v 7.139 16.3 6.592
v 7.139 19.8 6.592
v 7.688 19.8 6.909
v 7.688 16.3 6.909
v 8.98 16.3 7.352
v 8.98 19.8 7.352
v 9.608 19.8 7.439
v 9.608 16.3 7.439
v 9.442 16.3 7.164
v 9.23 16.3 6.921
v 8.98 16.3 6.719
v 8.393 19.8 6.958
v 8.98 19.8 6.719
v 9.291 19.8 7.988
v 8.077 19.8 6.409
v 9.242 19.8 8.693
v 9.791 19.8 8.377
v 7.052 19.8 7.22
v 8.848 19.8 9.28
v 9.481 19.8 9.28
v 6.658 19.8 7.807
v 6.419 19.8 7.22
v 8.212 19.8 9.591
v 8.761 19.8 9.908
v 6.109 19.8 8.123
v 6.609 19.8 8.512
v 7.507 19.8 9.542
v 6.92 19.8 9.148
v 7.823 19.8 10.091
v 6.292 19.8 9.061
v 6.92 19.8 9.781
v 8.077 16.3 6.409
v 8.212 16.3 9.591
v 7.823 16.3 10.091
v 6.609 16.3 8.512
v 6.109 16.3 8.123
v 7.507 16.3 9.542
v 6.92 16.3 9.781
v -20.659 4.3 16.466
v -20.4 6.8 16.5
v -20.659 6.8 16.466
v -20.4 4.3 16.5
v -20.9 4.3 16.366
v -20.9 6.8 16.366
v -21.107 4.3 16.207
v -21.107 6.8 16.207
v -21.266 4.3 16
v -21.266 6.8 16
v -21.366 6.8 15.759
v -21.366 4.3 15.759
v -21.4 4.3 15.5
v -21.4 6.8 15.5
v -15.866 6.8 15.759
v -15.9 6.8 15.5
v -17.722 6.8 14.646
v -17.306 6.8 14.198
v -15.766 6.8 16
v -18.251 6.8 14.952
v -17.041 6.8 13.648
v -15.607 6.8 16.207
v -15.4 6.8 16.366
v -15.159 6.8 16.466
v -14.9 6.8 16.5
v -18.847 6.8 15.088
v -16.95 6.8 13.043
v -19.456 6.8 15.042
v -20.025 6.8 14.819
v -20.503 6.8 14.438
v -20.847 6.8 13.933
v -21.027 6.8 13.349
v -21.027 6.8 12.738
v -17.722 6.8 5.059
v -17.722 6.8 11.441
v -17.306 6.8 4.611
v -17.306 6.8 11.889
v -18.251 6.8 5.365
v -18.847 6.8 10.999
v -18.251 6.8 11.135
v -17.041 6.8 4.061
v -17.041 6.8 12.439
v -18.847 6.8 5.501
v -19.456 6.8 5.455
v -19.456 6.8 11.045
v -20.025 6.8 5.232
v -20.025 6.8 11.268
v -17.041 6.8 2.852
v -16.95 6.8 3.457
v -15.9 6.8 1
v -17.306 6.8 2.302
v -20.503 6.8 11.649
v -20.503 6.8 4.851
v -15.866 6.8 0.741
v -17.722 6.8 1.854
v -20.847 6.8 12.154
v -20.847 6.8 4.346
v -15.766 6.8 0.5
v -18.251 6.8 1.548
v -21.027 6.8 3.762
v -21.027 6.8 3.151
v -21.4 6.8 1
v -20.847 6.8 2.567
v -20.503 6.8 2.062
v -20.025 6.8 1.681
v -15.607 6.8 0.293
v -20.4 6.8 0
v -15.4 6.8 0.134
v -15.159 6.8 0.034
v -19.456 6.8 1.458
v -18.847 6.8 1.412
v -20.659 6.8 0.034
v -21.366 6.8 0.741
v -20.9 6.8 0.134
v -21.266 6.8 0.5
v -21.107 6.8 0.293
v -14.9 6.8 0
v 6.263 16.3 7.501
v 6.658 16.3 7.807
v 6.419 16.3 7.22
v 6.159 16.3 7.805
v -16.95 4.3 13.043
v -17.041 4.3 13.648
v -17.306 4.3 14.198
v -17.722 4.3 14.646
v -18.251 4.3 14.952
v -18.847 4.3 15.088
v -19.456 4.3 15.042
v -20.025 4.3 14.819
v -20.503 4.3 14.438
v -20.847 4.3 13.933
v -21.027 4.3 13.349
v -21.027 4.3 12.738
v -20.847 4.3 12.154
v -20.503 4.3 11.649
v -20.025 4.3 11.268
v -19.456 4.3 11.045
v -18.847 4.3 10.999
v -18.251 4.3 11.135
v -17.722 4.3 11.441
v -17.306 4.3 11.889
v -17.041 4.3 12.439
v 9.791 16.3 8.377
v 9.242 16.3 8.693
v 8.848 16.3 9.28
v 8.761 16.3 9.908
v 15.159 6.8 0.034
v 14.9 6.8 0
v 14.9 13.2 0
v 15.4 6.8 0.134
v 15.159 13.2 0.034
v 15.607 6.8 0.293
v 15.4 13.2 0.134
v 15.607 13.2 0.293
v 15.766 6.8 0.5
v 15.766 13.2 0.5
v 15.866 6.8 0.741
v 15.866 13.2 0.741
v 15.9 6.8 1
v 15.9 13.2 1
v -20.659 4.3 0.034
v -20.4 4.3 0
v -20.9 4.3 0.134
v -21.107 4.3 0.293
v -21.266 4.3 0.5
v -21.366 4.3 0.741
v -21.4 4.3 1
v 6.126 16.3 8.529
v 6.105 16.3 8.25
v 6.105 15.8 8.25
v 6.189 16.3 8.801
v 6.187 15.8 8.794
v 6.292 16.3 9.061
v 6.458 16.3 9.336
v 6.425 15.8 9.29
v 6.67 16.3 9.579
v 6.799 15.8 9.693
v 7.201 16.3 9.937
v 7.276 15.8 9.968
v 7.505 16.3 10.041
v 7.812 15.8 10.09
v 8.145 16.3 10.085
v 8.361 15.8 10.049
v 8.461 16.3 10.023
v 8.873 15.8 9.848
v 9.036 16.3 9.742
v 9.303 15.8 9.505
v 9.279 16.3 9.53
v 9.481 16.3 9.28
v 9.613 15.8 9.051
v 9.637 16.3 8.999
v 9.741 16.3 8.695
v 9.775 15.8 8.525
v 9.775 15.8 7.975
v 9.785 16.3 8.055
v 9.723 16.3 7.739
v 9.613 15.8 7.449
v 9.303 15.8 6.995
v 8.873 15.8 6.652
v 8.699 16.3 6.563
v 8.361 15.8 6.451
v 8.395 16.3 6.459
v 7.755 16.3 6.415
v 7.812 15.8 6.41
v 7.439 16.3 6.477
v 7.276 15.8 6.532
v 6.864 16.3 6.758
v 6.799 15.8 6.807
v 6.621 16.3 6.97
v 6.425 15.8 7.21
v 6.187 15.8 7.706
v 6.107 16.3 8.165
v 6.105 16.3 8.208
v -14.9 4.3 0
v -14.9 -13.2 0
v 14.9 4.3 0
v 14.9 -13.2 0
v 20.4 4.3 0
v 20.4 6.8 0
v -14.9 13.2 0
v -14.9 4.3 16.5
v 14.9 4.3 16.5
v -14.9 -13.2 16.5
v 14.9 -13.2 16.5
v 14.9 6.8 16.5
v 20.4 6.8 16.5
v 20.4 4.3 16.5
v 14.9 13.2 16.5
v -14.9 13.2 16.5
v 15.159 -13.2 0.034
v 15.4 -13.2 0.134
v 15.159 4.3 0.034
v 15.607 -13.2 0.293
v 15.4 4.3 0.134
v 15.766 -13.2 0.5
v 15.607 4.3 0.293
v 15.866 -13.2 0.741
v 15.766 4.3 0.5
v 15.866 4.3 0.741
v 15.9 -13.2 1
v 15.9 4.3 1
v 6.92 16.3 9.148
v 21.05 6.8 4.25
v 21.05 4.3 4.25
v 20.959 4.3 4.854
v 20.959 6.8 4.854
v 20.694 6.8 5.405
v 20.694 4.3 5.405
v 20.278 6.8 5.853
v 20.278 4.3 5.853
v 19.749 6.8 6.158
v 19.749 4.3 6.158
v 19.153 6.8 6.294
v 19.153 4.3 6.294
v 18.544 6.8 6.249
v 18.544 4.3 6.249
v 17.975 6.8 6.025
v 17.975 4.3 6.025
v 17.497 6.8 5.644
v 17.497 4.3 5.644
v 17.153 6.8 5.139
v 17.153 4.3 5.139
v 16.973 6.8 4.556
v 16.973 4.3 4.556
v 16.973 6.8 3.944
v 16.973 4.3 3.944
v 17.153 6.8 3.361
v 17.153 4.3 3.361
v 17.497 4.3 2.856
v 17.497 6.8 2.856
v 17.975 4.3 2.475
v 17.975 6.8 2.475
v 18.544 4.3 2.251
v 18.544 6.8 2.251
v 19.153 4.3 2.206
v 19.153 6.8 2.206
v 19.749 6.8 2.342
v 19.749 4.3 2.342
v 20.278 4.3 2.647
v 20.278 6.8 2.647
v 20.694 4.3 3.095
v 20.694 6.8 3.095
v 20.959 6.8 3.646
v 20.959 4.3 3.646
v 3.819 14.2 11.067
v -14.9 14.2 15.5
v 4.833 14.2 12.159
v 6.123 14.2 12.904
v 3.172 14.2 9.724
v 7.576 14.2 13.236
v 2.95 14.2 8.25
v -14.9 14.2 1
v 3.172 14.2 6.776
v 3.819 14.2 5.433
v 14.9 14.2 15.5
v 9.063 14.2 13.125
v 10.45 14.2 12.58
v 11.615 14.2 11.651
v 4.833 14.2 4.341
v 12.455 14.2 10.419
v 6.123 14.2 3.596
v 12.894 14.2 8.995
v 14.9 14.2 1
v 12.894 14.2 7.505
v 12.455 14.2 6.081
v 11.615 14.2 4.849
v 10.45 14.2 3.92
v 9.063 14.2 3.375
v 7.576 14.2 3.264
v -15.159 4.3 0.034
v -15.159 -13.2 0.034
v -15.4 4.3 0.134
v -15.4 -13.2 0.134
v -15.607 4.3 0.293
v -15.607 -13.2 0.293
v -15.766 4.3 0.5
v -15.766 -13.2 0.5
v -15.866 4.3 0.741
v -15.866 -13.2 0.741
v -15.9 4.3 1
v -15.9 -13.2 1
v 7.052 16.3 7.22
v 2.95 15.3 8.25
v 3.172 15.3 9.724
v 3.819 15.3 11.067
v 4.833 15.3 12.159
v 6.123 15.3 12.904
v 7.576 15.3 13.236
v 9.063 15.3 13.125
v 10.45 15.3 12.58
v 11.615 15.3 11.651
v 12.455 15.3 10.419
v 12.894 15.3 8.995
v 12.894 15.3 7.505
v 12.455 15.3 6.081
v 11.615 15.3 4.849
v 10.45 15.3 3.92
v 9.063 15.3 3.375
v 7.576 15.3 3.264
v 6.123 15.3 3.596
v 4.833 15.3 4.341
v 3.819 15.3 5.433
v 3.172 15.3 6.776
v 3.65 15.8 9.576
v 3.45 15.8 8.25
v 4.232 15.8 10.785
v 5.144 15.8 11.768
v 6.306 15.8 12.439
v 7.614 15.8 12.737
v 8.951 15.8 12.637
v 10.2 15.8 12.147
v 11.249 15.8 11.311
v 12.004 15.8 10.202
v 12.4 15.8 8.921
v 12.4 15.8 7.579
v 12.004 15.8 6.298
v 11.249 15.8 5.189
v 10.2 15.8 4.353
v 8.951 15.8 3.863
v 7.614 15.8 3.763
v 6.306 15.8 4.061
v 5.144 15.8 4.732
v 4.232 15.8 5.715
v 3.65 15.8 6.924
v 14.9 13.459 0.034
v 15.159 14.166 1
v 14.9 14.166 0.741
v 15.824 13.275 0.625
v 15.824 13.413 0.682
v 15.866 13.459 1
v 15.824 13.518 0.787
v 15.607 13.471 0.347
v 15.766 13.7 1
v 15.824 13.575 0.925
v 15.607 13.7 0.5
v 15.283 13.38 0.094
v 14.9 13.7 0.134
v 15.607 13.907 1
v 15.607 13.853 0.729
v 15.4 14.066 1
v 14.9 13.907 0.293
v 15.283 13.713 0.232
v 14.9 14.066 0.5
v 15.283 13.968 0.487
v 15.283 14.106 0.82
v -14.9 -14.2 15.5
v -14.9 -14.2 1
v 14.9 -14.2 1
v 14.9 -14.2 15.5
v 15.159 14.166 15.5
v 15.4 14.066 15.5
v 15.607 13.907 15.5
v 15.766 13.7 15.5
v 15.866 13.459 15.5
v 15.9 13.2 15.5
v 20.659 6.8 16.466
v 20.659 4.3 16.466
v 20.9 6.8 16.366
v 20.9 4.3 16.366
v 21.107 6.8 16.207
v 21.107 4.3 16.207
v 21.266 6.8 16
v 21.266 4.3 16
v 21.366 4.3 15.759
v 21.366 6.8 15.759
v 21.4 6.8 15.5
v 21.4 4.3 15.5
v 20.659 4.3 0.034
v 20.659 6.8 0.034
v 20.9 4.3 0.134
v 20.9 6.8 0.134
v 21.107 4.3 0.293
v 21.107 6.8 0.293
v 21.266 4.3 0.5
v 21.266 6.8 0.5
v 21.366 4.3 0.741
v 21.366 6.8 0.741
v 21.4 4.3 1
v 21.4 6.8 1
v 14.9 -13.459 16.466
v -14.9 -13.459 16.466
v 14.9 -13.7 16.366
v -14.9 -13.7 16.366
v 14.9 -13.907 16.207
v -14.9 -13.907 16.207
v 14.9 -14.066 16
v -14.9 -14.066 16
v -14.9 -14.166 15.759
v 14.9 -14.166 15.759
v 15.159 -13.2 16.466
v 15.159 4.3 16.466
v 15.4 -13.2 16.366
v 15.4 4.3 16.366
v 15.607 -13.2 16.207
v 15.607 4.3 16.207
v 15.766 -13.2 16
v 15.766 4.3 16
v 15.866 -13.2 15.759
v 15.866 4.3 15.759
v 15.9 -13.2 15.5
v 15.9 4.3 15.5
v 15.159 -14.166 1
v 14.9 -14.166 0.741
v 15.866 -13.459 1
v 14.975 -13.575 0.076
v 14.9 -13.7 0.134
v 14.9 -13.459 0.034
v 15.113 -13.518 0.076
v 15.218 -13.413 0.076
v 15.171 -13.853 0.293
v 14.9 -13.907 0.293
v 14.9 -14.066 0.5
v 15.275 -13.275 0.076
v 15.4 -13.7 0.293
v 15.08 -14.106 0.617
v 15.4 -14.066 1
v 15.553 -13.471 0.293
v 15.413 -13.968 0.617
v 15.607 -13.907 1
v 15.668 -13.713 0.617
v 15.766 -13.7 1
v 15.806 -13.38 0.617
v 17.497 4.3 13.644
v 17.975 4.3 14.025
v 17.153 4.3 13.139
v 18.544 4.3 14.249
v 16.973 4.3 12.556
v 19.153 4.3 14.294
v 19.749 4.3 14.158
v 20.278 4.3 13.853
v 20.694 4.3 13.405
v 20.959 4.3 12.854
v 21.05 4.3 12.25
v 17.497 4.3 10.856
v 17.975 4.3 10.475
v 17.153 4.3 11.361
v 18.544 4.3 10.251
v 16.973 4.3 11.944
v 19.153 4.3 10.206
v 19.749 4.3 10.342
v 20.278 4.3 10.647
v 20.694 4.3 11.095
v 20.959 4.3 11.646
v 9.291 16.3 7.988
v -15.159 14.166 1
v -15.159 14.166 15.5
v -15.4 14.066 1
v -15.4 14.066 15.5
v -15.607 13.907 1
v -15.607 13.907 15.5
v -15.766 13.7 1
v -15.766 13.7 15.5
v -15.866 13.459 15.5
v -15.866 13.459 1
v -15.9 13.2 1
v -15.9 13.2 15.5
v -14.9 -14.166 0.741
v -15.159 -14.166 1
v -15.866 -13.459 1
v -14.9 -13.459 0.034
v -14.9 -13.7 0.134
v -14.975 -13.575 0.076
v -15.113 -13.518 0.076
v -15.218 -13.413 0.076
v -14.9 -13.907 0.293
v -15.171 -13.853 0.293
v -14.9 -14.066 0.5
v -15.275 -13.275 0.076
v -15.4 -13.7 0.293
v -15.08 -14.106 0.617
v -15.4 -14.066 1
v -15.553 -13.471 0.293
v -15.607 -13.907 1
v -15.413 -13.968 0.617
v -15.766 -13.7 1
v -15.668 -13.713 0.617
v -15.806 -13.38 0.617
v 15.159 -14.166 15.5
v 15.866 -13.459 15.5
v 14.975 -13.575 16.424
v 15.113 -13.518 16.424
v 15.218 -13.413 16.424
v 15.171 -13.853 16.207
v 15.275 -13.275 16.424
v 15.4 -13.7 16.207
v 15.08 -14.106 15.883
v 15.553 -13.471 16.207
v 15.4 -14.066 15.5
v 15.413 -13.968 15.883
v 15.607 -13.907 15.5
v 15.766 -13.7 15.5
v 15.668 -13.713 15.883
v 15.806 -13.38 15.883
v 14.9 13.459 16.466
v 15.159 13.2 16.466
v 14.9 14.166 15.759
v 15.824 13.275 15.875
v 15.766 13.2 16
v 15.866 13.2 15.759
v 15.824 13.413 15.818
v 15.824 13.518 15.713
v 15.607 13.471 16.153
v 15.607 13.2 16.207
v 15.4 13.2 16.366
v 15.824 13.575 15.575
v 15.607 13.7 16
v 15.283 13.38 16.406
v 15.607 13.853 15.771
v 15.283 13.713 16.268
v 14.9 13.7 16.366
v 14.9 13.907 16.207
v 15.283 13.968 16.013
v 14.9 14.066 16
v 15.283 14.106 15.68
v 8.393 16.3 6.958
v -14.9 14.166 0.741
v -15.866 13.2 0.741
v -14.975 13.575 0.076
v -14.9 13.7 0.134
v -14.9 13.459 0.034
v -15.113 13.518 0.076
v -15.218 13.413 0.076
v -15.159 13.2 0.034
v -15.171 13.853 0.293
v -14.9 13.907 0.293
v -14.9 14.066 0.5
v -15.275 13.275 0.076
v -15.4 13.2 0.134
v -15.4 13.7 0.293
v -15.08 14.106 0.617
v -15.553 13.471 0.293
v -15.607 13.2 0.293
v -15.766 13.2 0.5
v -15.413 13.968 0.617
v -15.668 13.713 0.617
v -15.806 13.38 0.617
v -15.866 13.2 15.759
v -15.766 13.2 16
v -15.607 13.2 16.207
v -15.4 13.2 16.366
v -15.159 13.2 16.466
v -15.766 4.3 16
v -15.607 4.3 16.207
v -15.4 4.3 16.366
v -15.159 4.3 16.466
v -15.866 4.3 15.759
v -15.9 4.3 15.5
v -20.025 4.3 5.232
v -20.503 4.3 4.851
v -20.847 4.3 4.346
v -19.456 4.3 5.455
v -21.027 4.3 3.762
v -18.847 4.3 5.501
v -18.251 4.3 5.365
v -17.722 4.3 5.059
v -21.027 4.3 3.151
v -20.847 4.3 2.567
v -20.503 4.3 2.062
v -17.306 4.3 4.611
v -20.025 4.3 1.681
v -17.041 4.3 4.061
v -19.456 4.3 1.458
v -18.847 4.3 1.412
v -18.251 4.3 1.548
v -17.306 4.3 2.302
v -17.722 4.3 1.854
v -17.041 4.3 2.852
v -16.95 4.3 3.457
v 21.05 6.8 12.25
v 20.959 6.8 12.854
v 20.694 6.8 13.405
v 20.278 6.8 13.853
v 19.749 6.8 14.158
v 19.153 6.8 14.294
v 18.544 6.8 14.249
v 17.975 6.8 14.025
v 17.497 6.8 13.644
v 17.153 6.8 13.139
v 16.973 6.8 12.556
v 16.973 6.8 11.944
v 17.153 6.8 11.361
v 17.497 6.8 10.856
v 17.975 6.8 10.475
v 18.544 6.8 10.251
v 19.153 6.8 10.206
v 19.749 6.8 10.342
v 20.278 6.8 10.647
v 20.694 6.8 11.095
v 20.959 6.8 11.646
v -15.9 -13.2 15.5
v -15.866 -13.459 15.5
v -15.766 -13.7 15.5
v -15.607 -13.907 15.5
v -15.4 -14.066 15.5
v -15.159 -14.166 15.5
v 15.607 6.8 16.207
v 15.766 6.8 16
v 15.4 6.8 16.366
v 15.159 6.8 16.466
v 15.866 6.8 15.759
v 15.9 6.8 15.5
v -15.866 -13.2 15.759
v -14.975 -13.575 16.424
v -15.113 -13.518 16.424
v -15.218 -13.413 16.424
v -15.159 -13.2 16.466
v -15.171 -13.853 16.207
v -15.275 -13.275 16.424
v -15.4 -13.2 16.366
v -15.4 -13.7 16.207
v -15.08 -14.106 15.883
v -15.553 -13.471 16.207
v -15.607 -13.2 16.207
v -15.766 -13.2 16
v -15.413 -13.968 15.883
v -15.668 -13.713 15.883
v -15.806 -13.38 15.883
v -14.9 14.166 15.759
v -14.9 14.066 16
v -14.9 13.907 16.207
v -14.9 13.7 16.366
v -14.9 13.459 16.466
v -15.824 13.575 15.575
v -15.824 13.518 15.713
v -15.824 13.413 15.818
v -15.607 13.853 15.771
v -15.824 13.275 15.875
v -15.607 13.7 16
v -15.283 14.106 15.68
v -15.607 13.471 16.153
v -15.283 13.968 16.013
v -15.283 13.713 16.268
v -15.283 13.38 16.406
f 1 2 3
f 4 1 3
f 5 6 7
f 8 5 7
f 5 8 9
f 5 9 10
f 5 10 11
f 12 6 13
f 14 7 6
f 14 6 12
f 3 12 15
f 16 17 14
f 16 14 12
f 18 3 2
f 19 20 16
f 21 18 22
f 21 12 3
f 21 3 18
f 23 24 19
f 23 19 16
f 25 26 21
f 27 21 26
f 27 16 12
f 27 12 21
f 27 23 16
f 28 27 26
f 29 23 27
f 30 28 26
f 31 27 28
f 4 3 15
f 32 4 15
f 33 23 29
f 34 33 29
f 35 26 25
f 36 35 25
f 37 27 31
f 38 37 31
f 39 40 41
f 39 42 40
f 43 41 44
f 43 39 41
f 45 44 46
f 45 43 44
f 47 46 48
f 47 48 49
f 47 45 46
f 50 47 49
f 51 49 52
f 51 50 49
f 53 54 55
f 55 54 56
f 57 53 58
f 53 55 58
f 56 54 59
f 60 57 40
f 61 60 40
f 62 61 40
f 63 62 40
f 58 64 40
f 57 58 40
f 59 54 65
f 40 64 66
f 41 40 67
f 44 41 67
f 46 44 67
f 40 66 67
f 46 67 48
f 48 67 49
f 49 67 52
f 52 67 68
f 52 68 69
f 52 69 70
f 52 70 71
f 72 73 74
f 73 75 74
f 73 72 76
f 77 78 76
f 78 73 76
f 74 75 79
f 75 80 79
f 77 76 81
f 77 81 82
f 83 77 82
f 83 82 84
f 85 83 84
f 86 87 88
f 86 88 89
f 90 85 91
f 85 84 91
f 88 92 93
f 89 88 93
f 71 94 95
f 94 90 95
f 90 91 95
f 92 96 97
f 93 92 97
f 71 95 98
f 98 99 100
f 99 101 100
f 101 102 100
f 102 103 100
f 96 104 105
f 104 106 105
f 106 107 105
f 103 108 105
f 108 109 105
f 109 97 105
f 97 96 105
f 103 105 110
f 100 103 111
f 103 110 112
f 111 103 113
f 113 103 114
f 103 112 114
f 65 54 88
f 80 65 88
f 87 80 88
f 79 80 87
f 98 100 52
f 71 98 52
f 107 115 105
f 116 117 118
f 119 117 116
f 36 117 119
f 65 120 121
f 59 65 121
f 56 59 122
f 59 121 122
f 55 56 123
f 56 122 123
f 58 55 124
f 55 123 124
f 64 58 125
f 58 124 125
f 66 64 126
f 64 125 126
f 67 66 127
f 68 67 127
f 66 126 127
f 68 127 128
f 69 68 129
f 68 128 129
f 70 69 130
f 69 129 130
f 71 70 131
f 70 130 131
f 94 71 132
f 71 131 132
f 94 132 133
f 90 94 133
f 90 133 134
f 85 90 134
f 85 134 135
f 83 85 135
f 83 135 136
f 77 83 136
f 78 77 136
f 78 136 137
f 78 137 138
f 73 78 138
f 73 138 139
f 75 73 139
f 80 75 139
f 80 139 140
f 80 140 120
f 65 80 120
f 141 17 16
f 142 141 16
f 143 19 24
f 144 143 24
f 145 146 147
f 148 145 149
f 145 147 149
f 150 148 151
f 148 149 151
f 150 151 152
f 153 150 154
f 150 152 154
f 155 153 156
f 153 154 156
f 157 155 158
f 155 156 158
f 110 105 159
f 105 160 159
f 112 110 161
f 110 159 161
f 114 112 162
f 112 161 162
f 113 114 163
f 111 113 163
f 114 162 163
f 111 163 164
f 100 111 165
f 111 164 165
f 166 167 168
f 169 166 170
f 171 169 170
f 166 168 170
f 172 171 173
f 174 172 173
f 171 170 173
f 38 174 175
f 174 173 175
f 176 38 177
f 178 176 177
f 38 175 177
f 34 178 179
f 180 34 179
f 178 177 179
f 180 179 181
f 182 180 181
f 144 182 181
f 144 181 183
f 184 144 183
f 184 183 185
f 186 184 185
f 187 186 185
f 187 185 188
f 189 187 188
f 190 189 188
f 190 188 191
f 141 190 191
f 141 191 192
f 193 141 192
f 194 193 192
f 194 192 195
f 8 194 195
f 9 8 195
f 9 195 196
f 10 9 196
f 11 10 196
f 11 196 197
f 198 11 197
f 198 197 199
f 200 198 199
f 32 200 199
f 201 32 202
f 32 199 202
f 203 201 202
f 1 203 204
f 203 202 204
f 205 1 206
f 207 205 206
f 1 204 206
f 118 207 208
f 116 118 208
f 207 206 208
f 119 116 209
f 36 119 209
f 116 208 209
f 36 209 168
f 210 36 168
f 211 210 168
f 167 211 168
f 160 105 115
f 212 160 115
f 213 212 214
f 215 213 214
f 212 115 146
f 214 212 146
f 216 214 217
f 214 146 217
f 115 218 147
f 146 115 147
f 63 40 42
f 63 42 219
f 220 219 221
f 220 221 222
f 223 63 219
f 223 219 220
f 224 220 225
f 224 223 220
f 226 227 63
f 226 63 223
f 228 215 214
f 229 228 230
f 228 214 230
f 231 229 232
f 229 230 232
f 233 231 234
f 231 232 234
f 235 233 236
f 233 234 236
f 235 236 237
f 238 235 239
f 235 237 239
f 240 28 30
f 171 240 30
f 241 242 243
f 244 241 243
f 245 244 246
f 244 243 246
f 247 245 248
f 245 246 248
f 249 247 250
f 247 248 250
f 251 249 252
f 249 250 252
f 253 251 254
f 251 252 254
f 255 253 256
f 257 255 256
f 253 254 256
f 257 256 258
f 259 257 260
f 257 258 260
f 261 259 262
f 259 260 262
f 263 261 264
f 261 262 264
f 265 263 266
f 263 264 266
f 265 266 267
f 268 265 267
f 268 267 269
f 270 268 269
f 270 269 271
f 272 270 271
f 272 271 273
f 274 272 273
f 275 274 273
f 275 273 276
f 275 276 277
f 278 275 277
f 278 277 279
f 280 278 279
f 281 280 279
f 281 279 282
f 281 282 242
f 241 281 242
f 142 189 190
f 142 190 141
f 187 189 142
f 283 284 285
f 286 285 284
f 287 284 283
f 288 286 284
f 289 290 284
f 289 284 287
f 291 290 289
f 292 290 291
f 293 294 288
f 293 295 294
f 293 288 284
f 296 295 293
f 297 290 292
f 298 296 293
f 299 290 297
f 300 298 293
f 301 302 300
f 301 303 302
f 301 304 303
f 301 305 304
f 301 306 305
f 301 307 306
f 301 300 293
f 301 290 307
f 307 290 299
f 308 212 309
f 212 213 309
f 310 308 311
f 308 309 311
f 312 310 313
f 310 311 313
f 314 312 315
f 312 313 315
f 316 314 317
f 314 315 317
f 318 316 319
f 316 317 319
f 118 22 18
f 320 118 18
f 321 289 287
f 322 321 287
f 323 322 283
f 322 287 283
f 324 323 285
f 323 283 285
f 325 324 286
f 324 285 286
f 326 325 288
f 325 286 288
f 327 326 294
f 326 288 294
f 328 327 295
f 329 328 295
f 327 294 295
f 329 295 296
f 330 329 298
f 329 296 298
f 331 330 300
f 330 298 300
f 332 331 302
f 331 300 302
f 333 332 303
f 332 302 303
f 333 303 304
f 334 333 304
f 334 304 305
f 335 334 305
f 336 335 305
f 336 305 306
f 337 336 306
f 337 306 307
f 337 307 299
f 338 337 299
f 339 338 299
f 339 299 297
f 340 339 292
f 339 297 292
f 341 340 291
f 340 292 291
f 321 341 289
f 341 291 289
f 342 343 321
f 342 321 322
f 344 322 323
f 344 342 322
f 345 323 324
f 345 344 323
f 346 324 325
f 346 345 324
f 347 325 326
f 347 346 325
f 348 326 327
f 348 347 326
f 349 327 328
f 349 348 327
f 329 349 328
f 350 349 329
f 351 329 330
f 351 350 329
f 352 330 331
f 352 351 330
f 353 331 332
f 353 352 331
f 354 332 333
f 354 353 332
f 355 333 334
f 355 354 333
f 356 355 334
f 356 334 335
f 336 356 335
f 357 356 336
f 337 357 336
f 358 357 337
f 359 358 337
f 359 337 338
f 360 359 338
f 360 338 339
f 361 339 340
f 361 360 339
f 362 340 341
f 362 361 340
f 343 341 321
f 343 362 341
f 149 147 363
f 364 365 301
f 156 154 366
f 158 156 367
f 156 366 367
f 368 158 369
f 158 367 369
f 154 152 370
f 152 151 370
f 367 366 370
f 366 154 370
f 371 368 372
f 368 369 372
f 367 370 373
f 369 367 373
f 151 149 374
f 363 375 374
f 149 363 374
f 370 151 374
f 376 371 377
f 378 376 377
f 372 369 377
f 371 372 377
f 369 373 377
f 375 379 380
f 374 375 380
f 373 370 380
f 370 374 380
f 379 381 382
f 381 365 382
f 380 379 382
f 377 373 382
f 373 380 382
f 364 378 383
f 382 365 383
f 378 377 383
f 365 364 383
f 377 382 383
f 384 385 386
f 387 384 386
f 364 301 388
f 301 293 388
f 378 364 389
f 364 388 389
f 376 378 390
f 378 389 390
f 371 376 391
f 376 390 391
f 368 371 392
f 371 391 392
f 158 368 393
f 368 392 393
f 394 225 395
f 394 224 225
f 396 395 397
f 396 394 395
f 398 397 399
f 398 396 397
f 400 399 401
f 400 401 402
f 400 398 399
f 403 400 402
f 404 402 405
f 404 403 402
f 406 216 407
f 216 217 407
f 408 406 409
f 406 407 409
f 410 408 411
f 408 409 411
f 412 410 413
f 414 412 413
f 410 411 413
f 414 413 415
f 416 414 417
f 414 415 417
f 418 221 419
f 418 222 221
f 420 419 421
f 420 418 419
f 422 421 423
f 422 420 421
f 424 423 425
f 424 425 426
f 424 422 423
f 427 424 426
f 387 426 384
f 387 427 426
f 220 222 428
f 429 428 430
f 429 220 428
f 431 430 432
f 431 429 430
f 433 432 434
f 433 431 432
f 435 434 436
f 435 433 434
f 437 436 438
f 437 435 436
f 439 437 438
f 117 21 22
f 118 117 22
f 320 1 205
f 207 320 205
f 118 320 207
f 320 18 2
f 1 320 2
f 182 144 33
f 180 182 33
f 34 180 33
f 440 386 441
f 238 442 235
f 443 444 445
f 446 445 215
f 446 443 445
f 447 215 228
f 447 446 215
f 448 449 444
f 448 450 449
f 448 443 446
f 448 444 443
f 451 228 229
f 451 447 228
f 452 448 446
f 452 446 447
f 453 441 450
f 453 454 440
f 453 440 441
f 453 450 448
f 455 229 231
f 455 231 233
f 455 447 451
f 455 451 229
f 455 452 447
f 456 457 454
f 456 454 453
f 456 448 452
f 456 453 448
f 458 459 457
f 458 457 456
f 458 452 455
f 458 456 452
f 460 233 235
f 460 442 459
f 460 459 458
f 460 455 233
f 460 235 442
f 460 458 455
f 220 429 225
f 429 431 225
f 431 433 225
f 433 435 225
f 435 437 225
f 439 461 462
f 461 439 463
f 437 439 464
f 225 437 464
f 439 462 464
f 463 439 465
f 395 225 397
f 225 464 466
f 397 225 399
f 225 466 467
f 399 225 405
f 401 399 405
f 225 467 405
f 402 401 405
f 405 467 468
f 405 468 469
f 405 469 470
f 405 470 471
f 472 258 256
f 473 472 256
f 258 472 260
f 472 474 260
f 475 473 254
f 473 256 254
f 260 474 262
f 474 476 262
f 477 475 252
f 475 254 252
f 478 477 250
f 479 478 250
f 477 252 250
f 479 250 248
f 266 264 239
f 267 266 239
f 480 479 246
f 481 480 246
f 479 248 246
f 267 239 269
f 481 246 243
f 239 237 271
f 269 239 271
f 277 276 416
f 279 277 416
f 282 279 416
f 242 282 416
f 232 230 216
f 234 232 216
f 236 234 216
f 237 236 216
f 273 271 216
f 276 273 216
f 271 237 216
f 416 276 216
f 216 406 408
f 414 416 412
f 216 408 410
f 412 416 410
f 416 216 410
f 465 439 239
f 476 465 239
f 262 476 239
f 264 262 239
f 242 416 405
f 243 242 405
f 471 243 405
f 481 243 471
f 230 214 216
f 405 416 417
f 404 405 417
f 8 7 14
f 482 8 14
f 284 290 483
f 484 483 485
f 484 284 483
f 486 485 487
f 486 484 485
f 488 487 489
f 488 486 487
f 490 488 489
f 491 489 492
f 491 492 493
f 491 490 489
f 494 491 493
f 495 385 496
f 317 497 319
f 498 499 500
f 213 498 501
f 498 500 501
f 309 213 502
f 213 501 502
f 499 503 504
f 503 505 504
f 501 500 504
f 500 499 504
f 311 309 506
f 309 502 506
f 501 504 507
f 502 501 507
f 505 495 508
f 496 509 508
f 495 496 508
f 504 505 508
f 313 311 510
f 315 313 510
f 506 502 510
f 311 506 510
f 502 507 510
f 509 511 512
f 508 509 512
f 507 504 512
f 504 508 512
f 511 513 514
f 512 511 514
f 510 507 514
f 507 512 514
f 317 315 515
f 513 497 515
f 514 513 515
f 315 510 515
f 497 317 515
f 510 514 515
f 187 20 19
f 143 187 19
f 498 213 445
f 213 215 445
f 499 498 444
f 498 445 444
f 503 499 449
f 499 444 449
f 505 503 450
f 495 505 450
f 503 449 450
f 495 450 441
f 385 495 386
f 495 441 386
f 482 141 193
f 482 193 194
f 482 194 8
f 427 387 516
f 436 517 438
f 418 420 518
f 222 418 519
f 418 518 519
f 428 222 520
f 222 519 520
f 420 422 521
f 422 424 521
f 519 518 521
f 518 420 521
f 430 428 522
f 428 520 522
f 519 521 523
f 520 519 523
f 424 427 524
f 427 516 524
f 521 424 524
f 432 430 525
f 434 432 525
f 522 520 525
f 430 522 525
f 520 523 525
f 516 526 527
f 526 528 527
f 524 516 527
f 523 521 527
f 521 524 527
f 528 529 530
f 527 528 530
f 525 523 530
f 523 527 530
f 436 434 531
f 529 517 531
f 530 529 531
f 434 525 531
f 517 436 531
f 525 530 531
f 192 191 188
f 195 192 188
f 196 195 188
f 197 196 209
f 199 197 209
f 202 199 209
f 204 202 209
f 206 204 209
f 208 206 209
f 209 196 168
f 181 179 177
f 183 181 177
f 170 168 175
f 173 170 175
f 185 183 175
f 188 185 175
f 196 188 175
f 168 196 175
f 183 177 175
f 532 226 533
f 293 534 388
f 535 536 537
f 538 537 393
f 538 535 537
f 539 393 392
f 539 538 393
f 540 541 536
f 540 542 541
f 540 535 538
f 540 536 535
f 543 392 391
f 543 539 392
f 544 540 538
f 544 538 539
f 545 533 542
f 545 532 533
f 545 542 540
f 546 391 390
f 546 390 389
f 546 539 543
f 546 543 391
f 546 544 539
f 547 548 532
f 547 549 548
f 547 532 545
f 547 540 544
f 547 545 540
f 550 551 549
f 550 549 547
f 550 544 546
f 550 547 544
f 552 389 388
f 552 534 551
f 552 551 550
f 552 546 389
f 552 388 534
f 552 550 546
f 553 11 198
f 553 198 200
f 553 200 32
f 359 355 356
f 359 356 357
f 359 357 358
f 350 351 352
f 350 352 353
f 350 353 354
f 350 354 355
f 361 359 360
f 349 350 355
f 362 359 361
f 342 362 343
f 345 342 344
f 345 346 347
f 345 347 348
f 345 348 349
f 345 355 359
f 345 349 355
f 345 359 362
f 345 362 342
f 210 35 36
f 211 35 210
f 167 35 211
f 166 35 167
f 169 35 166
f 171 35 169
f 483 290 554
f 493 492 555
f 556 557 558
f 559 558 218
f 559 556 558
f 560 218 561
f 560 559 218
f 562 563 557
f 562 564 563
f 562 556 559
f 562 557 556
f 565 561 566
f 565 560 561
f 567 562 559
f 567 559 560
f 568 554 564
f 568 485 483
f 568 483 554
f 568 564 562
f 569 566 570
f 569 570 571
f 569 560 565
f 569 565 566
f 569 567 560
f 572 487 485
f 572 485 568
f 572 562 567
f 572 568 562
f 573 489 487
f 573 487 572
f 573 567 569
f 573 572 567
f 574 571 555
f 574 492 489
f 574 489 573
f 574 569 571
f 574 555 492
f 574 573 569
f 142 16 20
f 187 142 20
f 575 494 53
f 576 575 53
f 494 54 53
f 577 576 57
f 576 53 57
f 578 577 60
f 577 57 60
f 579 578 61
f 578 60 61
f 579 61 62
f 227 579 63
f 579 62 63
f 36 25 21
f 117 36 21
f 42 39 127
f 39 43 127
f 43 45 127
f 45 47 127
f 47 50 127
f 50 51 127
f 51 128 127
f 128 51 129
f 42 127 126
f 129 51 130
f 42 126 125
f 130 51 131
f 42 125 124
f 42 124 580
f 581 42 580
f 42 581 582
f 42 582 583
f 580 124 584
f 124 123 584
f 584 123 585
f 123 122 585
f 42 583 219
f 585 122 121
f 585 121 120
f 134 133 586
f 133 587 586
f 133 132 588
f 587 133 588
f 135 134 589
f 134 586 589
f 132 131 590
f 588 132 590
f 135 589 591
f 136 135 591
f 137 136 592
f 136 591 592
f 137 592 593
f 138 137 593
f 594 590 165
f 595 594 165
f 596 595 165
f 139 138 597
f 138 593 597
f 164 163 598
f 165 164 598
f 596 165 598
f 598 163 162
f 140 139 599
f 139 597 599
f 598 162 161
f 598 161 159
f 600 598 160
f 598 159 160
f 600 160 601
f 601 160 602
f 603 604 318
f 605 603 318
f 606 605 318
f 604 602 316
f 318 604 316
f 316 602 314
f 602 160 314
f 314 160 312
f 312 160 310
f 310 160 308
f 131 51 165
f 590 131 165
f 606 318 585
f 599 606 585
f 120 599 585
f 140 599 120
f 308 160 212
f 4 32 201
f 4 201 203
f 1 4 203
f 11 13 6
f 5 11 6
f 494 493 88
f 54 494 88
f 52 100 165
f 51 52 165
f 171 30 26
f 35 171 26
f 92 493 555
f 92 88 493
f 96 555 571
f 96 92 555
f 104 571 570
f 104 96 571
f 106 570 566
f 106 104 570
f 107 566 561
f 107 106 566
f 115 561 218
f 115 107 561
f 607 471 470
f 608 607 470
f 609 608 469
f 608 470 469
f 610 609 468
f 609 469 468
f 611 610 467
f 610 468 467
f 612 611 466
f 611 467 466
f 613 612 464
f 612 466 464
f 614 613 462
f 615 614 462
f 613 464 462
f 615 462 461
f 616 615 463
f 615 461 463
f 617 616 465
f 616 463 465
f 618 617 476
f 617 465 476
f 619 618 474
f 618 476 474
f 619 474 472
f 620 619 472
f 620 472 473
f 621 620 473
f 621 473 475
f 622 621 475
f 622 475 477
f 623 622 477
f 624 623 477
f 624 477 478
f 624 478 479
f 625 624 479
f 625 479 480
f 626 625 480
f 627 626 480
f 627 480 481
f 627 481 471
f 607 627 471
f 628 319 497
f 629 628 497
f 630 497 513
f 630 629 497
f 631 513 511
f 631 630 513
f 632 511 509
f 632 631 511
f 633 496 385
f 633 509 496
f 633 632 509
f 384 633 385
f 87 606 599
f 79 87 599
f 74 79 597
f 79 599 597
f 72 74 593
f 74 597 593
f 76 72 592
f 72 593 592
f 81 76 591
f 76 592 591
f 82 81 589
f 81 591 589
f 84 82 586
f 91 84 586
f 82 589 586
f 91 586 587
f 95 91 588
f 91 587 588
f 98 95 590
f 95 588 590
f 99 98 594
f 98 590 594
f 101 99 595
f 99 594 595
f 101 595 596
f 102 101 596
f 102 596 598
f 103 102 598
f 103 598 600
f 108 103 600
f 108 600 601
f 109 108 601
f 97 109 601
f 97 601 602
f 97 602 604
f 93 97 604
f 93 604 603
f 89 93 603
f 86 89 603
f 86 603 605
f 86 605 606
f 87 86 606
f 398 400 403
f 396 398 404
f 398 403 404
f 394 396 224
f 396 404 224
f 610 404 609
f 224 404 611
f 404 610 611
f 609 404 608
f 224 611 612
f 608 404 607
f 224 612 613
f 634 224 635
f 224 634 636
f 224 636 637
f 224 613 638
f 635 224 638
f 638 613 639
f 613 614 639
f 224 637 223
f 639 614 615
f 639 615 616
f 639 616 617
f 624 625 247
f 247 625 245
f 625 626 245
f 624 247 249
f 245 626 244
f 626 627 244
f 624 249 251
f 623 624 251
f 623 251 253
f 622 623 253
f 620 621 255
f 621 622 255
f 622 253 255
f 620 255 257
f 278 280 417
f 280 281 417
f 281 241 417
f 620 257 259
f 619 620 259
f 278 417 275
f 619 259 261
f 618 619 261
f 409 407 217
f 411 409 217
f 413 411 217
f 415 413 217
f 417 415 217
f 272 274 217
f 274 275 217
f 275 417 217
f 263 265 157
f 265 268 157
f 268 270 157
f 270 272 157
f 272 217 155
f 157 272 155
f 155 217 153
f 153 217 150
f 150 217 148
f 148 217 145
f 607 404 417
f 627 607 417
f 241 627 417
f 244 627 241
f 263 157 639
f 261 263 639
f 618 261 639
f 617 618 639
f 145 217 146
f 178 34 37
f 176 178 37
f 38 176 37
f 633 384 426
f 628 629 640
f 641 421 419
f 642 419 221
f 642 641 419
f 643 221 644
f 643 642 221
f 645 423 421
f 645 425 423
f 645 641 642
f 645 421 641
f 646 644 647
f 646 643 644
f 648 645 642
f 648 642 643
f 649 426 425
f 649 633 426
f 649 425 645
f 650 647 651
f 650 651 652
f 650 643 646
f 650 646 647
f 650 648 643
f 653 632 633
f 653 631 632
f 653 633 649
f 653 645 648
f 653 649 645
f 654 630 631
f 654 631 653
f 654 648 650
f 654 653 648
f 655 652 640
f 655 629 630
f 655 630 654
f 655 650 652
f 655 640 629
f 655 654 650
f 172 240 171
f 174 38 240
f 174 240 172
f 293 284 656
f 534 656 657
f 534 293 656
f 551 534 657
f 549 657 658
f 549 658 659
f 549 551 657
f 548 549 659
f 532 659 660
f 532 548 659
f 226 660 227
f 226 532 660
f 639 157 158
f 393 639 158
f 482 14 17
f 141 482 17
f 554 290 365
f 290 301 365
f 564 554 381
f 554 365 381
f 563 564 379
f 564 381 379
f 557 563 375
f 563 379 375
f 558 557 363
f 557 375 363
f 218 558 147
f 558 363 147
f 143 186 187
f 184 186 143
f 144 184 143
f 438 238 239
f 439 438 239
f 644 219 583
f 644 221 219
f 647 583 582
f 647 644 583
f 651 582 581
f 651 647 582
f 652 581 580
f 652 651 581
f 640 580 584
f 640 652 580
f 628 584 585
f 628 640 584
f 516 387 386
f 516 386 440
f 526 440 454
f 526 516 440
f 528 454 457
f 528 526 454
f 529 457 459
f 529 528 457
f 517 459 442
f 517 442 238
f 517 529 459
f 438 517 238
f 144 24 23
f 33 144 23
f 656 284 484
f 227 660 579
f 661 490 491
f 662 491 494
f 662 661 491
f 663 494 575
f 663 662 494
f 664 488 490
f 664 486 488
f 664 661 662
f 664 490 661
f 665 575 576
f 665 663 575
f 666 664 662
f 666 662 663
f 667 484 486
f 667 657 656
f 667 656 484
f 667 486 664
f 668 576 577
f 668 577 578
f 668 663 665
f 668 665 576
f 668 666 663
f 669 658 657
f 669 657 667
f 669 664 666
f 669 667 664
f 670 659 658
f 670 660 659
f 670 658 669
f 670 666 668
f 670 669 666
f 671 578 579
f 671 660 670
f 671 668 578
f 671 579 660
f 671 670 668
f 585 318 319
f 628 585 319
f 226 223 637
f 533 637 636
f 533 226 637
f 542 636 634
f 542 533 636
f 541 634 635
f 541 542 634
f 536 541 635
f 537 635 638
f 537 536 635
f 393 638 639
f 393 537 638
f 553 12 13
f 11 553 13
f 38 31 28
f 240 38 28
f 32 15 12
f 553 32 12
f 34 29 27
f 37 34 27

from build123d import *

# Parameters (mm, degrees)
F0_W      = 31.8
F0_H      = 7.4
F0_H_2    = 2.5
F0_H_3    = 18.5
F1_DEPTH  = 16.5
F4_R      = 2.05
F5_DEPTH  = 9.901
F6_R      = 5
F6_R_2    = 1.8453220601
F7_DEPTH  = 1.6
F8_SIZE   = 0.5
F9_R      = 1.8453220601
F10_DEPTH = 4
F12_DEPTH = 3.5
F13_R     = 1


# Not quite as in the source:
# - a feature names something its author has since deleted; it is built from what else it names


with BuildPart() as f1:
    # F0 (on Top) → F1 (new body)
    with BuildSketch(Plane.XY):
        with Locations((0, 10.5)):
            Rectangle(F0_W, F0_H)
        with Locations((0, 5.55)):
            Rectangle(F0_W, F0_H_2)
        with Locations((0, -4.95)):
            Rectangle(F0_W, F0_H_3)
        Polygon((-15.9, 4.3), (-15.9, 6.8), (-19, 6.8), (-21.4, 6.8), (-21.4, 4.3), (-19, 4.3), align=None)
        Polygon((19, 6.8), (15.9, 6.8), (15.9, 4.3), (19, 4.3), (21.4, 4.3), (21.4, 6.8), align=None)
    extrude(amount=F1_DEPTH)

    # F4 (on offset) → F5 (cut, through all)
    with BuildSketch(Plane.XZ.offset(-4.3)):
        with Locations((-19, 13.0433406178)):
            Circle(F4_R)
        with Locations((-19, 3.4566593822)):
            Circle(F4_R)
        with Locations((19, 12.25)):
            Circle(F4_R)
        with Locations((19, 4.25)):
            Circle(F4_R)
    extrude(amount=-F5_DEPTH, mode=Mode.SUBTRACT)

    # F6 (on face) → F7 (join)
    with BuildSketch(Plane(origin=(0, 14.2, 0), x_dir=(-1, 0, 0), z_dir=(0, 1, 0))):
        with Locations((-7.95, 8.25)):
            Circle(F6_R)
        with Locations((-7.95, 8.25)):
            Circle(F6_R_2, mode=Mode.SUBTRACT)
        with Locations((-7.95, 8.25)):
            Circle(F6_R_2)
    extrude(amount=F7_DEPTH)

    # F8
    f8_edges = [f1.edges().sort_by_distance(p)[0] for p in [
        (12.95, 15.8, 8.25),
    ]]
    chamfer(f8_edges, length=F8_SIZE)

    # F13
    f13_edges = [f1.edges().sort_by_distance(p)[0] for p in [
        (-15.9, -14.2, 8.25),
        (15.9, -14.2, 8.25),
        (0, -14.2, 0),
        (0, -14.2, 16.5),
        (0, 14.2, 16.5),
        (15.9, -4.95, 16.5),
        (15.9, -4.95, 0),
        (-15.9, -4.95, 0),
        (-15.9, -4.95, 16.5),
        (-15.9, 14.2, 8.25),
        (0, 14.2, 0),
        (15.9, 10.5, 0),
        (15.9, 10.5, 16.5),
        (21.4, 5.55, 16.5),
        (21.4, 5.55, 0),
        (-21.4, 5.55, 0),
        (-21.4, 5.55, 16.5),
        (-15.9, 10.5, 16.5),
        (-15.9, 10.5, 0),
        (15.9, 14.2, 8.25),
    ]]
    fillet(f13_edges, radius=F13_R)


with BuildPart() as f10:
    # F9 (on face) → F10 (new body)
    with BuildSketch(Plane(origin=(0, 15.8, 0), x_dir=(-1, 0, 0), z_dir=(0, 1, 0))):
        with Locations((-7.95, 8.25)):
            Circle(F9_R)
    extrude(amount=F10_DEPTH)

    # F11 (on face) → F12 (cut)
    with BuildSketch(Plane(origin=(0, 19.8, 0), x_dir=(-1, 0, 0), z_dir=(0, 1, 0))):
        with BuildLine():
            Line((-9.4809376593, 9.2802637472), (-8.8475196691, 9.2802637472))
            Line((-8.8475196691, 9.2802637472), (-8.760699031, 9.9077034073))
            ThreePointArc((-8.760699031, 9.9077034073), (-9.1621203443, 9.6413941844), (-9.4809376593, 9.2802637472))
        make_face()
        with BuildLine():
            Line((-9.7909627781, 8.376765748), (-9.2424067074, 8.6934747431))
            Line((-9.2424067074, 8.6934747431), (-9.4809376593, 9.2802637472))
            ThreePointArc((-9.4809376593, 9.2802637472), (-9.6954241028, 8.8489225382), (-9.7909627781, 8.376765748))
        make_face()
        with BuildLine():
            Line((-9.6077034073, 7.439300969), (-9.2909944122, 7.9878570397))
            Line((-9.2909944122, 7.9878570397), (-9.7909627781, 8.376765748))
            ThreePointArc((-9.7909627781, 8.376765748), (-9.7610428825, 7.8959700816), (-9.6077034073, 7.439300969))
        make_face()
        with BuildLine():
            Line((-8.9802637472, 6.7190623407), (-8.9802637472, 7.3524803309))
            Line((-8.9802637472, 7.3524803309), (-9.6077034073, 7.439300969))
            ThreePointArc((-9.6077034073, 7.439300969), (-9.3413941844, 7.0378796557), (-8.9802637472, 6.7190623407))
        make_face()
        with BuildLine():
            Line((-8.076765748, 6.4090372219), (-8.3934747431, 6.9575932926))
            Line((-8.3934747431, 6.9575932926), (-8.9802637472, 6.7190623407))
            ThreePointArc((-8.9802637472, 6.7190623407), (-8.5489225382, 6.5045758972), (-8.076765748, 6.4090372219))
        make_face()
        with BuildLine():
            Line((-7.139300969, 6.5922965927), (-7.6878570397, 6.9090055878))
            Line((-7.6878570397, 6.9090055878), (-8.076765748, 6.4090372219))
            ThreePointArc((-8.076765748, 6.4090372219), (-7.5959700816, 6.4389571175), (-7.139300969, 6.5922965927))
        make_face()
        with BuildLine():
            Line((-6.4190623407, 7.2197362528), (-7.0524803309, 7.2197362528))
            Line((-7.0524803309, 7.2197362528), (-7.139300969, 6.5922965927))
            ThreePointArc((-7.139300969, 6.5922965927), (-6.7378796557, 6.8586058156), (-6.4190623407, 7.2197362528))
        make_face()
        with BuildLine():
            Line((-6.1090372219, 8.123234252), (-6.6575932926, 7.8065252569))
            Line((-6.6575932926, 7.8065252569), (-6.4190623407, 7.2197362528))
            ThreePointArc((-6.4190623407, 7.2197362528), (-6.2045758972, 7.6510774618), (-6.1090372219, 8.123234252))
        make_face()
        with BuildLine():
            Line((-6.2922965927, 9.060699031), (-6.6090055878, 8.5121429603))
            Line((-6.6090055878, 8.5121429603), (-6.1090372219, 8.123234252))
            ThreePointArc((-6.1090372219, 8.123234252), (-6.1057680824, 8.1865796598), (-6.1046779399, 8.25))
            ThreePointArc((-6.1046779399, 8.25), (-6.1521943693, 8.6660629994), (-6.2922965927, 9.060699031))
        make_face()
        with BuildLine():
            Line((-6.9197362528, 9.7809376593), (-6.9197362528, 9.1475196691))
            Line((-6.9197362528, 9.1475196691), (-6.2922965927, 9.060699031))
            ThreePointArc((-6.2922965927, 9.060699031), (-6.5586058156, 9.4621203443), (-6.9197362528, 9.7809376593))
        make_face()
        with BuildLine():
            Line((-7.823234252, 10.0909627781), (-7.5065252569, 9.5424067074))
            Line((-7.5065252569, 9.5424067074), (-6.9197362528, 9.7809376593))
            ThreePointArc((-6.9197362528, 9.7809376593), (-7.3510774618, 9.9954241028), (-7.823234252, 10.0909627781))
        make_face()
        with BuildLine():
            Line((-8.760699031, 9.9077034073), (-8.2121429603, 9.5909944122))
            Line((-8.2121429603, 9.5909944122), (-7.823234252, 10.0909627781))
            ThreePointArc((-7.823234252, 10.0909627781), (-8.3040299184, 10.0610428825), (-8.760699031, 9.9077034073))
        make_face()
    extrude(amount=-F12_DEPTH, mode=Mode.SUBTRACT)


solid = Compound([f1.part, f10.part])
